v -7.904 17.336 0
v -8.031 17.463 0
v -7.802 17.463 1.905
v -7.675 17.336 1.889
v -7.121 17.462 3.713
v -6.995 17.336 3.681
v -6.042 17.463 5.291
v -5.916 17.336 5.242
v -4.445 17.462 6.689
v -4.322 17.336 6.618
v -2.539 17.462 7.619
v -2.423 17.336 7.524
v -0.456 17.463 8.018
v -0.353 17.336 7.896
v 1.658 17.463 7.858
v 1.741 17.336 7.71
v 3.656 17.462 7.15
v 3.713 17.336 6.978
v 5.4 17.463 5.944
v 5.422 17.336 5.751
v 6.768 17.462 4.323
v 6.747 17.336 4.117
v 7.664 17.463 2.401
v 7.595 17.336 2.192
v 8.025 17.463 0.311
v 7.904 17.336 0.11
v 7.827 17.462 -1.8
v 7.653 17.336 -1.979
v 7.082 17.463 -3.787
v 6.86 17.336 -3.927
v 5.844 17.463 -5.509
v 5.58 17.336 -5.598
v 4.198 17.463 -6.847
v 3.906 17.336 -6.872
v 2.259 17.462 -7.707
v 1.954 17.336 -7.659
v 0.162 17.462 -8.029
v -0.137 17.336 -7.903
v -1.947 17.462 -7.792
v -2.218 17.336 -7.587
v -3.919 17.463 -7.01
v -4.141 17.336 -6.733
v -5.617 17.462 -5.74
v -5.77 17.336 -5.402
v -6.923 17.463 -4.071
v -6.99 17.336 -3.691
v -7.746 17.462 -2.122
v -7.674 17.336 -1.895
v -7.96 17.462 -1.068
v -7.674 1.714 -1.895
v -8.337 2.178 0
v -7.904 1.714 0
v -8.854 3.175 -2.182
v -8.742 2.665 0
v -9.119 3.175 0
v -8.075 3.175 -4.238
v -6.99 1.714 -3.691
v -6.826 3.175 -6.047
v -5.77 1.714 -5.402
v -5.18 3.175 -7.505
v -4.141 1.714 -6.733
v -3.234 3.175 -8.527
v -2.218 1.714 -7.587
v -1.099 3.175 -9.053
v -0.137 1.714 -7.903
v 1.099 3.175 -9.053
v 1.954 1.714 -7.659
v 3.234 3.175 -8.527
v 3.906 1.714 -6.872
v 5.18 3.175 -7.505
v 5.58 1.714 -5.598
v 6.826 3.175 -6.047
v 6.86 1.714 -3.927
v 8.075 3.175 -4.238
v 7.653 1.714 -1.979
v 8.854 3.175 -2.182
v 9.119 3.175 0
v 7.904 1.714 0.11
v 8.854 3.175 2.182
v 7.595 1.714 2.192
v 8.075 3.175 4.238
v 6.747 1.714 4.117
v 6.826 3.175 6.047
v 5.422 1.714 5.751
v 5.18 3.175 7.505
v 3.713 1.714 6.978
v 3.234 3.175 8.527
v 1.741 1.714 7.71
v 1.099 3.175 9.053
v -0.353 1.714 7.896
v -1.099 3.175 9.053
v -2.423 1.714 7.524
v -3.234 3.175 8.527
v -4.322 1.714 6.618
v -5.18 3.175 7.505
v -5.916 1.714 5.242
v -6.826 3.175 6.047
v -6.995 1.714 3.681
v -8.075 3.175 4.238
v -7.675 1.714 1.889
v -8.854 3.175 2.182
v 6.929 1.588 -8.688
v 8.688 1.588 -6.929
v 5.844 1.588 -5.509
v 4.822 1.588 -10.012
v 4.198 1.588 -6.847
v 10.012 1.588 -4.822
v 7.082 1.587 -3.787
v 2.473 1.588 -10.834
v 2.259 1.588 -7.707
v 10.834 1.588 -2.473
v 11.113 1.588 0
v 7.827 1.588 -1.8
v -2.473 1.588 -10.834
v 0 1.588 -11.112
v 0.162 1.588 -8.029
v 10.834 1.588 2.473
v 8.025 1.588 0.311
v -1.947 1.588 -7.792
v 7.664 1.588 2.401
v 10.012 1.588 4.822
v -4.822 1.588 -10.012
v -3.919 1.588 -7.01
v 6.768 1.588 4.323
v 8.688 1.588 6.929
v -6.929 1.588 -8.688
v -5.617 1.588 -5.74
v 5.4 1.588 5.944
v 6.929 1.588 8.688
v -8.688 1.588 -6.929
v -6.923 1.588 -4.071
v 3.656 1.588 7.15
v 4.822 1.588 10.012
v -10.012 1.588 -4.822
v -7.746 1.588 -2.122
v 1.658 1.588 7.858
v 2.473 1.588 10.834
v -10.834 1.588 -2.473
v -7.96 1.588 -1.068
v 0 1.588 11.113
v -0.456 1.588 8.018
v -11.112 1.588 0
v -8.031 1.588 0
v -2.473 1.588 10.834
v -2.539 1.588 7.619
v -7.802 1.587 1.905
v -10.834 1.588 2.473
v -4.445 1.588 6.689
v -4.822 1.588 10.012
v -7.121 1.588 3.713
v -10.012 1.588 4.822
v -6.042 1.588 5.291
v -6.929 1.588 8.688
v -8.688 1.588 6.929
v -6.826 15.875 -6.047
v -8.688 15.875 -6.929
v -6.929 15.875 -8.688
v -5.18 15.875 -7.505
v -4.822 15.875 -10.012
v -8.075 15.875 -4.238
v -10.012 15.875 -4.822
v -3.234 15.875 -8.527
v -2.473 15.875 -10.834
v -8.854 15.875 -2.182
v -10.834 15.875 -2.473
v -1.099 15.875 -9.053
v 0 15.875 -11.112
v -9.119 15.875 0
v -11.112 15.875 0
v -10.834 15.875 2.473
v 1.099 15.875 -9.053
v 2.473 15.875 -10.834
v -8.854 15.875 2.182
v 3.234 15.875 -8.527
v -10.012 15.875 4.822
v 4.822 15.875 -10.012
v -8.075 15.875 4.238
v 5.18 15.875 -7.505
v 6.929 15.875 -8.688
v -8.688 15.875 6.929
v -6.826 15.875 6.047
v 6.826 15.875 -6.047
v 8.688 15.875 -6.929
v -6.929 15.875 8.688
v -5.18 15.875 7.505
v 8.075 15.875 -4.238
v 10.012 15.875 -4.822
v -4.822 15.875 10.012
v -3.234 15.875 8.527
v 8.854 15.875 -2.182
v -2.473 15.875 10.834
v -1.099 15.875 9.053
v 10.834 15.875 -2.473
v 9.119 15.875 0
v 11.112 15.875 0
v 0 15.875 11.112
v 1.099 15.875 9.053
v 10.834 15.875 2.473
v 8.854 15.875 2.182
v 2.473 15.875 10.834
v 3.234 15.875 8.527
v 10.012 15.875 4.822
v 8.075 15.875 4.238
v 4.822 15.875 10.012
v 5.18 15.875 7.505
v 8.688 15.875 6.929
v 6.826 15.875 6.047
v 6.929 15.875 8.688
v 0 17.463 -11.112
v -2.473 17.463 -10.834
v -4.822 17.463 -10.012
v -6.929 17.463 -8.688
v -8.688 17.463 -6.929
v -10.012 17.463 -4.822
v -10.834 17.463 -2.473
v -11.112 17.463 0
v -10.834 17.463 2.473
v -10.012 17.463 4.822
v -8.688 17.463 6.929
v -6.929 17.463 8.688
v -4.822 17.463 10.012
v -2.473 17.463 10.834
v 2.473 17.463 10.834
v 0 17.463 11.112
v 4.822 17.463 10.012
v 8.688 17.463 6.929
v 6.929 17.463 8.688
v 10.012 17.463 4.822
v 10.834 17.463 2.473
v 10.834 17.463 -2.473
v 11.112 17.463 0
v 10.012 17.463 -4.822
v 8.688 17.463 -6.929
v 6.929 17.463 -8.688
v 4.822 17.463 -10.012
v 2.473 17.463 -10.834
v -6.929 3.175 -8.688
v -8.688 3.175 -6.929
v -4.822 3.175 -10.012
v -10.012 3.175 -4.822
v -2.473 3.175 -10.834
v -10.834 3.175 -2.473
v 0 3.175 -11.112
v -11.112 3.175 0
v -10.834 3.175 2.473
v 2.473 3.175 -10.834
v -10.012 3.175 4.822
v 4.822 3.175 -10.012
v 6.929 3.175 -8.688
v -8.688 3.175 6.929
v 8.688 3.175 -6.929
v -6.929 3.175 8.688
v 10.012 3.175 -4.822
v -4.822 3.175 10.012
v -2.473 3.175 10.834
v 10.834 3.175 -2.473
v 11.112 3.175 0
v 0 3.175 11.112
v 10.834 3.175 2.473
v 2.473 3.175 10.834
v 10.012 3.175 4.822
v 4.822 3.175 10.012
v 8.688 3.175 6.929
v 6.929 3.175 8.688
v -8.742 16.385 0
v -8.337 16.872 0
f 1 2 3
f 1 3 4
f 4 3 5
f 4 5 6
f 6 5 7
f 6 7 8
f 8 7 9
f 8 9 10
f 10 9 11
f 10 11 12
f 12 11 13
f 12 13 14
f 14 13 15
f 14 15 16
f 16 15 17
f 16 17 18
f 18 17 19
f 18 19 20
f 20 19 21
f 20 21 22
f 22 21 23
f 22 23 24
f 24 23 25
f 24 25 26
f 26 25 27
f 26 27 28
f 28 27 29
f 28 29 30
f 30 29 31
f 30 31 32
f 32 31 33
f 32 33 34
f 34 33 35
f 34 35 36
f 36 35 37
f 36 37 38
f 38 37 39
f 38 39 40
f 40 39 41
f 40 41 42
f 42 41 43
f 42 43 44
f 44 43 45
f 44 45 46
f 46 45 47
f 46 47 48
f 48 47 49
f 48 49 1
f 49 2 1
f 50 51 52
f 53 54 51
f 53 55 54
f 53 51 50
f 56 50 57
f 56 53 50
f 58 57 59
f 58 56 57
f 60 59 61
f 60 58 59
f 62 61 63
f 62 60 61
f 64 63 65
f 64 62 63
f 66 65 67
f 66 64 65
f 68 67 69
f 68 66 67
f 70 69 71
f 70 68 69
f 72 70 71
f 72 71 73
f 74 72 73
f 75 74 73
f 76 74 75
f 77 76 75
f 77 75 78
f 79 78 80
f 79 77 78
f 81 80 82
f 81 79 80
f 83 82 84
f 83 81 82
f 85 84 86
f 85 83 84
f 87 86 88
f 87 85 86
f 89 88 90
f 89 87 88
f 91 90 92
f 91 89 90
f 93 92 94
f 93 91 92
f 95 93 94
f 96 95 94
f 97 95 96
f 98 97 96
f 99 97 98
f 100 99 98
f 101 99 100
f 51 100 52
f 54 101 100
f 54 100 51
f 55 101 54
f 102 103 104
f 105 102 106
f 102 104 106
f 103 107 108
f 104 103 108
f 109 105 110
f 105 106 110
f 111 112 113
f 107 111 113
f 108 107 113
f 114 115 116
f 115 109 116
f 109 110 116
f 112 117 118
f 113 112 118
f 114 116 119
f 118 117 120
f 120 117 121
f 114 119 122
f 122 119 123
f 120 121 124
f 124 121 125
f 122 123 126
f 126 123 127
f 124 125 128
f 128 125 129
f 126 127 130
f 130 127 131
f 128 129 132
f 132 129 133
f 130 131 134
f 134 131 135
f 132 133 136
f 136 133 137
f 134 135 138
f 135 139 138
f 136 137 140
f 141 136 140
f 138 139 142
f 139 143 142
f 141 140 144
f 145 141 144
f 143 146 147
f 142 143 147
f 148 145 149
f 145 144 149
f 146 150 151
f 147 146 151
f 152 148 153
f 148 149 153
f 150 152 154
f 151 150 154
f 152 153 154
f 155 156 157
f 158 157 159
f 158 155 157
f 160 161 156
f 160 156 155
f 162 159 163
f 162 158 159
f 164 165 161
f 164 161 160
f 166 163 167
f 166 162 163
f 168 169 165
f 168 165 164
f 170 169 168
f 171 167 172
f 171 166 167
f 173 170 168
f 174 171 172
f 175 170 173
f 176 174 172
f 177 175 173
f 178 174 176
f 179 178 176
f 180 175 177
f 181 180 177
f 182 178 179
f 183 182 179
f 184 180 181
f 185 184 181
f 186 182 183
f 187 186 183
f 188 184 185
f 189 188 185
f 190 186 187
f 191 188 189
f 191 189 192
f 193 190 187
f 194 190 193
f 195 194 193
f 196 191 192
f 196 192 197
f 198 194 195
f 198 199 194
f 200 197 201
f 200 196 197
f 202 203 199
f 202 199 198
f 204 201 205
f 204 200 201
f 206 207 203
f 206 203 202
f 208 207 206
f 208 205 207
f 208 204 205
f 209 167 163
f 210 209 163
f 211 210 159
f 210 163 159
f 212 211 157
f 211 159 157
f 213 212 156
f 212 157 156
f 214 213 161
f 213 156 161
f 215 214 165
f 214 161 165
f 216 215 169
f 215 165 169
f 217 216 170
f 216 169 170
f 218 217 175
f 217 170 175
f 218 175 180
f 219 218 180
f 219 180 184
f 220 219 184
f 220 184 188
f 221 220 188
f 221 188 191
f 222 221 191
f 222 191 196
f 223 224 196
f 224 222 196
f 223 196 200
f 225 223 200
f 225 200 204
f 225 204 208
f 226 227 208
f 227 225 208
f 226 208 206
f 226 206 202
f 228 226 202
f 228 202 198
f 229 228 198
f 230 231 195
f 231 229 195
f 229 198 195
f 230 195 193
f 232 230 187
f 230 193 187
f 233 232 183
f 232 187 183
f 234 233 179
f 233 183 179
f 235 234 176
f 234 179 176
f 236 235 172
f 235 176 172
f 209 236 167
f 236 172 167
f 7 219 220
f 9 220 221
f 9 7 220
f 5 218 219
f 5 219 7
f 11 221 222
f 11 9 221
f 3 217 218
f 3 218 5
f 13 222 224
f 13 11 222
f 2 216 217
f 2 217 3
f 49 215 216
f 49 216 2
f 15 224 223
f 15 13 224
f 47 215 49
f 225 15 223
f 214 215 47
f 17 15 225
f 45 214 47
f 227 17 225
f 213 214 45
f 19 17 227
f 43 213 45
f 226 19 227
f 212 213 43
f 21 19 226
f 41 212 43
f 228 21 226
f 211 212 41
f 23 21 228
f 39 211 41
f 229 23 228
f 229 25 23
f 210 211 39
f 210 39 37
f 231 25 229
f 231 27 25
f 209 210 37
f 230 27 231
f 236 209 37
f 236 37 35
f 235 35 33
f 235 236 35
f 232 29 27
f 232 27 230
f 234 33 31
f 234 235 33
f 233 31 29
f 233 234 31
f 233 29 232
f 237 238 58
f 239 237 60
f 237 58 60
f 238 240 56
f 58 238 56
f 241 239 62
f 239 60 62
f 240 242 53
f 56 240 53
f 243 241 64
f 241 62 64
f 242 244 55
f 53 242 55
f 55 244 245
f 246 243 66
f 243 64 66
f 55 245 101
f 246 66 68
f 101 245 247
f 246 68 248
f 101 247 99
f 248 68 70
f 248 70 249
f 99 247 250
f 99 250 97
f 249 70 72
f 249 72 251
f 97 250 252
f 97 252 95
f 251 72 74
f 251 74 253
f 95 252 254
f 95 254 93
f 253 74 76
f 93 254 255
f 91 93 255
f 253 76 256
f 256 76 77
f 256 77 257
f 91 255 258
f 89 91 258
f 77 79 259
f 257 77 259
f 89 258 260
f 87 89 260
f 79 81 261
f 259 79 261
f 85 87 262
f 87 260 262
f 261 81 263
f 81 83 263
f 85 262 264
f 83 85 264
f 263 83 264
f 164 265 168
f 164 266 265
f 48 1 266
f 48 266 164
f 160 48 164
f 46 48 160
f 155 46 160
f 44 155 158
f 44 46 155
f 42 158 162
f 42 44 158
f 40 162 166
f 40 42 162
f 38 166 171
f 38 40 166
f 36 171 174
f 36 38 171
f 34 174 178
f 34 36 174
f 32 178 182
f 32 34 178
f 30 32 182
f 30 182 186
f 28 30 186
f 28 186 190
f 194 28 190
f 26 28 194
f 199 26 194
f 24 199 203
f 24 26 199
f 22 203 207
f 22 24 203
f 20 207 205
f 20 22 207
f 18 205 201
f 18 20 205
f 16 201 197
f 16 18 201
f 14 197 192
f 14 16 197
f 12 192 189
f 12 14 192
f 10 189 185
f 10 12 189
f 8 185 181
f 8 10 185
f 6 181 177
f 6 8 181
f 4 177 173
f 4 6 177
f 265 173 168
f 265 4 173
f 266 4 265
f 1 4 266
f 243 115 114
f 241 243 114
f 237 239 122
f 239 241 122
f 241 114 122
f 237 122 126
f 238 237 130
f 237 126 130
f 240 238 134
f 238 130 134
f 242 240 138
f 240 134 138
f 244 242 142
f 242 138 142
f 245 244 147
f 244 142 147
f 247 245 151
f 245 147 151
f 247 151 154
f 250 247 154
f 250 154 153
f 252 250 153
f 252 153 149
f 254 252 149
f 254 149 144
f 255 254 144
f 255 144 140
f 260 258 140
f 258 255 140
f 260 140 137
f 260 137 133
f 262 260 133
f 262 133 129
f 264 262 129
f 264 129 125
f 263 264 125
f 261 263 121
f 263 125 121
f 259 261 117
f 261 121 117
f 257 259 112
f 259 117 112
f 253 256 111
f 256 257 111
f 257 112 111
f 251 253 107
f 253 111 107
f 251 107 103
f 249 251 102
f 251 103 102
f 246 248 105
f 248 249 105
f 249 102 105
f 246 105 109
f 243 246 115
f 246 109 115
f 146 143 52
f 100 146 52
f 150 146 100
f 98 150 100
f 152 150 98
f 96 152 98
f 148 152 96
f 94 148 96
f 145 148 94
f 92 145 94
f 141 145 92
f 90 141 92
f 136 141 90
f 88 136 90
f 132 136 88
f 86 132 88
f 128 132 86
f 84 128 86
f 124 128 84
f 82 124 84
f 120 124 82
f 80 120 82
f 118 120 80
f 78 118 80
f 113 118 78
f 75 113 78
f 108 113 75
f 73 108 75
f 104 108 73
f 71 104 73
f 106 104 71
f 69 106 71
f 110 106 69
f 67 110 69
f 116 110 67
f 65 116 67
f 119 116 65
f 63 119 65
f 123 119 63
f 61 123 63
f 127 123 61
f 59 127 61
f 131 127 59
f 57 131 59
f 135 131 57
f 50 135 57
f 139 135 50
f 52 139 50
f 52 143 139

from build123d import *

# Parameters (mm, degrees)
SKETCH1_R           = 11.112499999999999
BOSS_EXTRUDE1_DEPTH = 19.05
SKETCH2_R           = 6.35
CUT_EXTRUDE1_DEPTH  = 25.69570433294017
SKETCH4_W           = 30.524379262921272
SKETCH4_H           = 12.7
CUT_EXTRUDE2_DEPTH  = 25.4
SKETCH5_W           = 22.224999999999998
SKETCH5_H           = 1.5874999999999986
CUT_EXTRUDE3_DEPTH  = 25.4
CHAMFER2_SIZE       = 0.254
CHAMFER2_SIZE2      = 0.17961447466301902
CHAMFER3_SIZE       = 0.254
CHAMFER3_SIZE2      = 0.17961447466301902


with BuildPart() as part:
    # Sketch1 → Boss-Extrude1 (new body)
    with BuildSketch(Plane(origin=(0, 0, 0), x_dir=(1, 0, 0), z_dir=(0, 1, 0))):
        with Locations(Location((0, 0, 0), (0, 0, 90))):
            Circle(SKETCH1_R)
    extrude(amount=BOSS_EXTRUDE1_DEPTH)

    # Sketch2 → Cut-Extrude1 (cut, through all)
    with BuildSketch(Plane(origin=(0, 19.05, 0), x_dir=(1, 0, 0), z_dir=(0, 1, 0))):
        with Locations(Location((0, 0, 0), (0, 0, 270))):
            Circle(SKETCH2_R)
    extrude(amount=-CUT_EXTRUDE1_DEPTH, mode=Mode.SUBTRACT)

    # Sketch3 → Cut-Revolve1 (revolve, cut)
    with BuildSketch(Plane.XY):
        with BuildLine():
            Line((-1.9e-16, 20.637500000000003), (2.53e-15, -1.5874999999999952))
            ThreePointArc((2.53e-15, -1.5874999999999952), (-11.112499999999999, 9.525000000000006), (-1.9e-16, 20.637500000000003))
        make_face()
    revolve(axis=Axis((-1.9e-16, 23.066651012529398, 0), (1e-17, -1, 0)), mode=Mode.SUBTRACT)


with BuildPart() as cut_revolve1_piece_1:
    # of the separate pieces the step leaves, piece 1, a body of its own (cut_revolve1_pieces)
    add(part.part.solids().sort_by_distance((0, 0, -11.1125))[0])


with BuildPart() as cut_revolve1_piece_2:
    # of the separate pieces the step leaves, piece 2, a body of its own (cut_revolve1_pieces)
    add(part.part.solids().sort_by_distance((0, 19.05, -11.1125))[0])


with BuildPart() as cut_extrude2_tool:
    # Sketch4 → Cut-Extrude2 (new, symmetric)
    with BuildSketch(Plane.XY):
        with Locations((-7.11e-15, 9.525000000000004)):
            Rectangle(SKETCH4_W, SKETCH4_H)
    extrude(amount=CUT_EXTRUDE2_DEPTH, both=True)


with BuildPart() as cut_revolve1_piece_1_1:
    add(cut_revolve1_piece_1.part)

    # Cut-Extrude2: cut by cut_extrude2_tool
    add(cut_extrude2_tool.part, mode=Mode.SUBTRACT)


with BuildPart() as cut_revolve1_piece_2_1:
    add(cut_revolve1_piece_2.part)

    # Cut-Extrude2: cut by cut_extrude2_tool
    add(cut_extrude2_tool.part, mode=Mode.SUBTRACT)


with BuildPart() as cut_extrude3_tool:
    # Sketch5 → Cut-Extrude3 (new, symmetric)
    with BuildSketch(Plane.XY):
        with Locations((0, 18.25625)):
            Rectangle(SKETCH5_W, SKETCH5_H)
        Polygon((-11.112499999999999, 1.388e-14), (11.112499999999999, 1.388e-14), (11.112499999999999, 1.5875000000000017), (-11.112499999999999, 1.5875000000000026), align=None)
    extrude(amount=CUT_EXTRUDE3_DEPTH, both=True)


with BuildPart() as cut_revolve1_piece_1_2:
    add(cut_revolve1_piece_1_1.part)

    # Cut-Extrude3: cut by cut_extrude3_tool
    add(cut_extrude3_tool.part, mode=Mode.SUBTRACT)

    # Chamfer3
    chamfer3_edges = [cut_revolve1_piece_1_2.edges().sort_by_distance(p)[0] for p in [
        (7.777129933336585, 1.5875000000000021, 9.5e-16),
    ]]
    chamfer3_side = [cut_revolve1_piece_1_2.faces().sort_by_distance(p)[0] for p in [
        (-1.53e-15, 1.5875000000000021, 10.798191035762574),
    ]]
    chamfer(chamfer3_edges, length=CHAMFER3_SIZE, length2=CHAMFER3_SIZE2, reference=chamfer3_side[0])


with BuildPart() as cut_revolve1_piece_2_2:
    add(cut_revolve1_piece_2_1.part)

    # Cut-Extrude3: cut by cut_extrude3_tool
    add(cut_extrude3_tool.part, mode=Mode.SUBTRACT)

    # Chamfer2
    chamfer2_edges = [cut_revolve1_piece_2_2.edges().sort_by_distance(p)[0] for p in [
        (7.777129933336592, 17.462500000000002, 9.5e-16),
    ]]
    chamfer2_side = [cut_revolve1_piece_2_2.faces().sort_by_distance(p)[0] for p in [
        (6.6e-16, 17.462500000000002, 10.798191035762578),
    ]]
    chamfer(chamfer2_edges, length=CHAMFER2_SIZE, length2=CHAMFER2_SIZE2, reference=chamfer2_side[0])


solid = Compound([cut_revolve1_piece_1_2.part, cut_revolve1_piece_2_2.part])
